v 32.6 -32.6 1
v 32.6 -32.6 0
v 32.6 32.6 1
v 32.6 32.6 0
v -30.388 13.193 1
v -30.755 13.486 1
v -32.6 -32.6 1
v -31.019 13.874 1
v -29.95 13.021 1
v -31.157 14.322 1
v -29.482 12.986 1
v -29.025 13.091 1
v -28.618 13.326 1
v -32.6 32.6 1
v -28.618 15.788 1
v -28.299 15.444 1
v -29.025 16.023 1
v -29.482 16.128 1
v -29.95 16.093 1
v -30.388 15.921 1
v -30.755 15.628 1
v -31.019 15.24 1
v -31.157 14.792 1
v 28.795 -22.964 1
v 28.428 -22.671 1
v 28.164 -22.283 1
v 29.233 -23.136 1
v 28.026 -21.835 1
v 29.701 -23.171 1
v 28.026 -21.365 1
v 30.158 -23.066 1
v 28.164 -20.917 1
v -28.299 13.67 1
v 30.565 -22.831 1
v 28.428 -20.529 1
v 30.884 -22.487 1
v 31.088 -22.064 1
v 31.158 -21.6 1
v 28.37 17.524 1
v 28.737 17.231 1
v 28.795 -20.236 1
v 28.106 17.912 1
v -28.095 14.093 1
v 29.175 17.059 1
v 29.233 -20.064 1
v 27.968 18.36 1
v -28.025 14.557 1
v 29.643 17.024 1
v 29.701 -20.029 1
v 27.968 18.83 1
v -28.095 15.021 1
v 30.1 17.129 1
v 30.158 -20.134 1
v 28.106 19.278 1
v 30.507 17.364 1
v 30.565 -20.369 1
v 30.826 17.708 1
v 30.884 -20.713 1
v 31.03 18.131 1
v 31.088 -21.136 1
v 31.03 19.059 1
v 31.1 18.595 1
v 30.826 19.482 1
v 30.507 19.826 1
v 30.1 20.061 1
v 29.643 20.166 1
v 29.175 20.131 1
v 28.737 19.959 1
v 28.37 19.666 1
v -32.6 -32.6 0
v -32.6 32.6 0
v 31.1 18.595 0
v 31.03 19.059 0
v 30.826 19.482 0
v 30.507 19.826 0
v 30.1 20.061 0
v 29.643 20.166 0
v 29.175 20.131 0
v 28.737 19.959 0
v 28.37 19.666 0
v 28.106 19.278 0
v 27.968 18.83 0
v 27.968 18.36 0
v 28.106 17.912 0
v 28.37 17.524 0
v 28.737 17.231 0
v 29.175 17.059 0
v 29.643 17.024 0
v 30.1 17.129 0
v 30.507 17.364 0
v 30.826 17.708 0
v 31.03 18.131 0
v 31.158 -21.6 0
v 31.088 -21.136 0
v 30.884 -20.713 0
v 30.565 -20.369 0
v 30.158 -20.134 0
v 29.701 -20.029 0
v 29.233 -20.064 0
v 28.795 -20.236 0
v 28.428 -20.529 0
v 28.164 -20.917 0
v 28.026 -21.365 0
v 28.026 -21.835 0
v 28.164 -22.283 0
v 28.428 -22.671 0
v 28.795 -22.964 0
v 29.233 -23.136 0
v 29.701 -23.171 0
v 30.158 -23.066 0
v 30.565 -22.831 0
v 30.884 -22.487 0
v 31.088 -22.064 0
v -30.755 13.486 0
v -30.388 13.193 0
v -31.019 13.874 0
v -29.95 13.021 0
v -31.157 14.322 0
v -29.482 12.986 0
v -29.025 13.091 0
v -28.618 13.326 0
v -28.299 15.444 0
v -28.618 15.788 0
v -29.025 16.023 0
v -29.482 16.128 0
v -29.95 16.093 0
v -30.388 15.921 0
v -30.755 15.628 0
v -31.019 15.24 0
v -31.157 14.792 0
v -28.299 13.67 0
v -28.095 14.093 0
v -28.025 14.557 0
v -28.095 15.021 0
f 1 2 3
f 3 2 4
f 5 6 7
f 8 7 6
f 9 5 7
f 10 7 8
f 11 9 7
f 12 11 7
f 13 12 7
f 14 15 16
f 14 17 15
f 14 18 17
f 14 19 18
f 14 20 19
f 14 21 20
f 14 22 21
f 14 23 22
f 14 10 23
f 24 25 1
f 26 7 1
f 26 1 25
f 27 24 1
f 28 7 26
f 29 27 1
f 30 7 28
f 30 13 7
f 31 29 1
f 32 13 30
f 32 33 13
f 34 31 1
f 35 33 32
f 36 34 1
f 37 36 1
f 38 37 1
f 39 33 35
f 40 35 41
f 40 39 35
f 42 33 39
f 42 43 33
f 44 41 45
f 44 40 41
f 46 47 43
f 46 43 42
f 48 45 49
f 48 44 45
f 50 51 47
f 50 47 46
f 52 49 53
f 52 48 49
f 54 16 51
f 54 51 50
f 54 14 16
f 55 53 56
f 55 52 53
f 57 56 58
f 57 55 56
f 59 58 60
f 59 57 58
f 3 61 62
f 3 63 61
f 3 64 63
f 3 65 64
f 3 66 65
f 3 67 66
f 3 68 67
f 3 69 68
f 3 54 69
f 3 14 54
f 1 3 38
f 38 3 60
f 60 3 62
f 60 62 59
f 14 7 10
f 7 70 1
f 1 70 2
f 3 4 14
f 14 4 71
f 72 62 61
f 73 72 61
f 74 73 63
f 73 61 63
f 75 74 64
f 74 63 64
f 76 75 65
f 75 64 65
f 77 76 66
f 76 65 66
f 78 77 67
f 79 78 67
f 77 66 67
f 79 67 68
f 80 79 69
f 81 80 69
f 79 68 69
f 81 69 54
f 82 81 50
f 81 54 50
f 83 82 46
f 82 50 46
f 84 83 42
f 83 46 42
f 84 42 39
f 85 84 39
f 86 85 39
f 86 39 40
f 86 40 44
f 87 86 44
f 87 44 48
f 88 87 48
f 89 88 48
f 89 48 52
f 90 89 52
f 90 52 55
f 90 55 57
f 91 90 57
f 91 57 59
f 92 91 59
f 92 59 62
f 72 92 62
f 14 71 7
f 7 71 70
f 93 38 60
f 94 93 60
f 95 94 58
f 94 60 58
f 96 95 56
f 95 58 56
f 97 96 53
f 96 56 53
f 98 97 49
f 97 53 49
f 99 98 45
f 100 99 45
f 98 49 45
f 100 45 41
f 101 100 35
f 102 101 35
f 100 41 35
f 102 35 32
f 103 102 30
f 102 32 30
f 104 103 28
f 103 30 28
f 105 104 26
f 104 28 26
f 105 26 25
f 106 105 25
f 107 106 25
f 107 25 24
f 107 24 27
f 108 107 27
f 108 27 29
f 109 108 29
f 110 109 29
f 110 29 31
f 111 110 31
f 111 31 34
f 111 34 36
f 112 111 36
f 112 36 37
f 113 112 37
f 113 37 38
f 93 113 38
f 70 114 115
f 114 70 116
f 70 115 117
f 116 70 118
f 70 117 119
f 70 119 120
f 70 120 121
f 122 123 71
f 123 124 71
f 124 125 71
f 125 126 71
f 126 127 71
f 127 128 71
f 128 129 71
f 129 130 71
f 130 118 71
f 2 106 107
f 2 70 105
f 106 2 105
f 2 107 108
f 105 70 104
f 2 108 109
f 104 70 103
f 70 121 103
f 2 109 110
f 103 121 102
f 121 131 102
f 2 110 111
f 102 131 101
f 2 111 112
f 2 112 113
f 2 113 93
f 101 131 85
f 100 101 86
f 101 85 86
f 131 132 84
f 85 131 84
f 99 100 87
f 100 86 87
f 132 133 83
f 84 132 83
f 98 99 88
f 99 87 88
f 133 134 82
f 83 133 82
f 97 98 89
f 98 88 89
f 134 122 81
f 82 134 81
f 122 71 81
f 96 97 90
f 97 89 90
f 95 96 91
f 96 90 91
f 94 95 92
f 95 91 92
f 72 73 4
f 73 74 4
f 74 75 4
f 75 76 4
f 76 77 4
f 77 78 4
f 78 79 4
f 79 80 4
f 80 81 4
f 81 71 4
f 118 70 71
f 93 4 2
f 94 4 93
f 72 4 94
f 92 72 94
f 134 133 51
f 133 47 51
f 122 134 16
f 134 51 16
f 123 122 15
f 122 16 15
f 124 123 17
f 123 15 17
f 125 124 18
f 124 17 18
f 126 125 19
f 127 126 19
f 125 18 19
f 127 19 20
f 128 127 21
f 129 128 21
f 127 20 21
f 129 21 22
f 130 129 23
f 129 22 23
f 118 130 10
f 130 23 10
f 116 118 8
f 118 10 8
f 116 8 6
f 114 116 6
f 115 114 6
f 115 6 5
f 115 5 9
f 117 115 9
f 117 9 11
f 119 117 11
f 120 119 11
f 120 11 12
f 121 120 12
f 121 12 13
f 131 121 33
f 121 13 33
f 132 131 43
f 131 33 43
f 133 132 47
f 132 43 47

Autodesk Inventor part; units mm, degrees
ref_plane "YZ Plane" through (0, 0, 0) normal (1, 0, 0) x (0, 1, 0)
ref_plane "XZ Plane" through (0, 0, 0) normal (0, 1, 0) x (-1, 0, 0)
ref_plane "XY Plane" through (0, 0, 0) normal (0, 0, 1) x (1, 0, 0)
sketch "Sketch1" plane through (0, 0, 0) normal (0, 0, 1) x (1, 0, 0)
  line L0 (-32.6, -32.6) -> (32.6, -32.6)
  line L1 (32.6, -32.6) -> (32.6, 32.6)
  line L2 (32.6, 32.6) -> (-32.6, 32.6)
  line L3 (-32.6, 32.6) -> (-32.6, -32.6)
  line L4 (-32.6, -32.6) -> (32.6, 32.6) construction
  line L5 (32.6, -32.6) -> (-32.6, 32.6) construction
  point P0 (0, 0)
  dimension "d0" = 65.2
  dimension "d1" = 65.2
extrude "Extrusion1" add sketch "Sketch1" along normal blind 1
sketch "Sketch2" plane through (0, 0, 1) normal (0, 0, 1) x (1, 0, 0)
  circle A0 centre (-29.6, 14.557) radius 1.575
  circle A1 centre (29.525, 18.595) radius 1.575
  circle A2 centre (29.583, -21.6) radius 1.575
  line L0 (-32.6, 32.6) -> (-32.6, -32.6) projected
  line L1 (32.6, 32.6) -> (-32.6, 32.6) projected
  line L2 (32.6, -32.6) -> (32.6, 32.6) projected
  line L3 (-32.6, -32.6) -> (32.6, -32.6) projected
  point P0 (0, 0)
  dimension "d4" = 3
  dimension "d5" = 18.043
  dimension "d6" = 3.075
  dimension "d7" = 14.005
  dimension "d8" = 11
  dimension "d9" = 3.017
  dimension "d10" = 3.15
  dimension "d11" = 3.15
  dimension "d12" = 3.15
extrude "Extrusion2" cut sketch "Sketch2" against normal blind 1 contours A0 | A1 | A2
properties part number "PCB"
